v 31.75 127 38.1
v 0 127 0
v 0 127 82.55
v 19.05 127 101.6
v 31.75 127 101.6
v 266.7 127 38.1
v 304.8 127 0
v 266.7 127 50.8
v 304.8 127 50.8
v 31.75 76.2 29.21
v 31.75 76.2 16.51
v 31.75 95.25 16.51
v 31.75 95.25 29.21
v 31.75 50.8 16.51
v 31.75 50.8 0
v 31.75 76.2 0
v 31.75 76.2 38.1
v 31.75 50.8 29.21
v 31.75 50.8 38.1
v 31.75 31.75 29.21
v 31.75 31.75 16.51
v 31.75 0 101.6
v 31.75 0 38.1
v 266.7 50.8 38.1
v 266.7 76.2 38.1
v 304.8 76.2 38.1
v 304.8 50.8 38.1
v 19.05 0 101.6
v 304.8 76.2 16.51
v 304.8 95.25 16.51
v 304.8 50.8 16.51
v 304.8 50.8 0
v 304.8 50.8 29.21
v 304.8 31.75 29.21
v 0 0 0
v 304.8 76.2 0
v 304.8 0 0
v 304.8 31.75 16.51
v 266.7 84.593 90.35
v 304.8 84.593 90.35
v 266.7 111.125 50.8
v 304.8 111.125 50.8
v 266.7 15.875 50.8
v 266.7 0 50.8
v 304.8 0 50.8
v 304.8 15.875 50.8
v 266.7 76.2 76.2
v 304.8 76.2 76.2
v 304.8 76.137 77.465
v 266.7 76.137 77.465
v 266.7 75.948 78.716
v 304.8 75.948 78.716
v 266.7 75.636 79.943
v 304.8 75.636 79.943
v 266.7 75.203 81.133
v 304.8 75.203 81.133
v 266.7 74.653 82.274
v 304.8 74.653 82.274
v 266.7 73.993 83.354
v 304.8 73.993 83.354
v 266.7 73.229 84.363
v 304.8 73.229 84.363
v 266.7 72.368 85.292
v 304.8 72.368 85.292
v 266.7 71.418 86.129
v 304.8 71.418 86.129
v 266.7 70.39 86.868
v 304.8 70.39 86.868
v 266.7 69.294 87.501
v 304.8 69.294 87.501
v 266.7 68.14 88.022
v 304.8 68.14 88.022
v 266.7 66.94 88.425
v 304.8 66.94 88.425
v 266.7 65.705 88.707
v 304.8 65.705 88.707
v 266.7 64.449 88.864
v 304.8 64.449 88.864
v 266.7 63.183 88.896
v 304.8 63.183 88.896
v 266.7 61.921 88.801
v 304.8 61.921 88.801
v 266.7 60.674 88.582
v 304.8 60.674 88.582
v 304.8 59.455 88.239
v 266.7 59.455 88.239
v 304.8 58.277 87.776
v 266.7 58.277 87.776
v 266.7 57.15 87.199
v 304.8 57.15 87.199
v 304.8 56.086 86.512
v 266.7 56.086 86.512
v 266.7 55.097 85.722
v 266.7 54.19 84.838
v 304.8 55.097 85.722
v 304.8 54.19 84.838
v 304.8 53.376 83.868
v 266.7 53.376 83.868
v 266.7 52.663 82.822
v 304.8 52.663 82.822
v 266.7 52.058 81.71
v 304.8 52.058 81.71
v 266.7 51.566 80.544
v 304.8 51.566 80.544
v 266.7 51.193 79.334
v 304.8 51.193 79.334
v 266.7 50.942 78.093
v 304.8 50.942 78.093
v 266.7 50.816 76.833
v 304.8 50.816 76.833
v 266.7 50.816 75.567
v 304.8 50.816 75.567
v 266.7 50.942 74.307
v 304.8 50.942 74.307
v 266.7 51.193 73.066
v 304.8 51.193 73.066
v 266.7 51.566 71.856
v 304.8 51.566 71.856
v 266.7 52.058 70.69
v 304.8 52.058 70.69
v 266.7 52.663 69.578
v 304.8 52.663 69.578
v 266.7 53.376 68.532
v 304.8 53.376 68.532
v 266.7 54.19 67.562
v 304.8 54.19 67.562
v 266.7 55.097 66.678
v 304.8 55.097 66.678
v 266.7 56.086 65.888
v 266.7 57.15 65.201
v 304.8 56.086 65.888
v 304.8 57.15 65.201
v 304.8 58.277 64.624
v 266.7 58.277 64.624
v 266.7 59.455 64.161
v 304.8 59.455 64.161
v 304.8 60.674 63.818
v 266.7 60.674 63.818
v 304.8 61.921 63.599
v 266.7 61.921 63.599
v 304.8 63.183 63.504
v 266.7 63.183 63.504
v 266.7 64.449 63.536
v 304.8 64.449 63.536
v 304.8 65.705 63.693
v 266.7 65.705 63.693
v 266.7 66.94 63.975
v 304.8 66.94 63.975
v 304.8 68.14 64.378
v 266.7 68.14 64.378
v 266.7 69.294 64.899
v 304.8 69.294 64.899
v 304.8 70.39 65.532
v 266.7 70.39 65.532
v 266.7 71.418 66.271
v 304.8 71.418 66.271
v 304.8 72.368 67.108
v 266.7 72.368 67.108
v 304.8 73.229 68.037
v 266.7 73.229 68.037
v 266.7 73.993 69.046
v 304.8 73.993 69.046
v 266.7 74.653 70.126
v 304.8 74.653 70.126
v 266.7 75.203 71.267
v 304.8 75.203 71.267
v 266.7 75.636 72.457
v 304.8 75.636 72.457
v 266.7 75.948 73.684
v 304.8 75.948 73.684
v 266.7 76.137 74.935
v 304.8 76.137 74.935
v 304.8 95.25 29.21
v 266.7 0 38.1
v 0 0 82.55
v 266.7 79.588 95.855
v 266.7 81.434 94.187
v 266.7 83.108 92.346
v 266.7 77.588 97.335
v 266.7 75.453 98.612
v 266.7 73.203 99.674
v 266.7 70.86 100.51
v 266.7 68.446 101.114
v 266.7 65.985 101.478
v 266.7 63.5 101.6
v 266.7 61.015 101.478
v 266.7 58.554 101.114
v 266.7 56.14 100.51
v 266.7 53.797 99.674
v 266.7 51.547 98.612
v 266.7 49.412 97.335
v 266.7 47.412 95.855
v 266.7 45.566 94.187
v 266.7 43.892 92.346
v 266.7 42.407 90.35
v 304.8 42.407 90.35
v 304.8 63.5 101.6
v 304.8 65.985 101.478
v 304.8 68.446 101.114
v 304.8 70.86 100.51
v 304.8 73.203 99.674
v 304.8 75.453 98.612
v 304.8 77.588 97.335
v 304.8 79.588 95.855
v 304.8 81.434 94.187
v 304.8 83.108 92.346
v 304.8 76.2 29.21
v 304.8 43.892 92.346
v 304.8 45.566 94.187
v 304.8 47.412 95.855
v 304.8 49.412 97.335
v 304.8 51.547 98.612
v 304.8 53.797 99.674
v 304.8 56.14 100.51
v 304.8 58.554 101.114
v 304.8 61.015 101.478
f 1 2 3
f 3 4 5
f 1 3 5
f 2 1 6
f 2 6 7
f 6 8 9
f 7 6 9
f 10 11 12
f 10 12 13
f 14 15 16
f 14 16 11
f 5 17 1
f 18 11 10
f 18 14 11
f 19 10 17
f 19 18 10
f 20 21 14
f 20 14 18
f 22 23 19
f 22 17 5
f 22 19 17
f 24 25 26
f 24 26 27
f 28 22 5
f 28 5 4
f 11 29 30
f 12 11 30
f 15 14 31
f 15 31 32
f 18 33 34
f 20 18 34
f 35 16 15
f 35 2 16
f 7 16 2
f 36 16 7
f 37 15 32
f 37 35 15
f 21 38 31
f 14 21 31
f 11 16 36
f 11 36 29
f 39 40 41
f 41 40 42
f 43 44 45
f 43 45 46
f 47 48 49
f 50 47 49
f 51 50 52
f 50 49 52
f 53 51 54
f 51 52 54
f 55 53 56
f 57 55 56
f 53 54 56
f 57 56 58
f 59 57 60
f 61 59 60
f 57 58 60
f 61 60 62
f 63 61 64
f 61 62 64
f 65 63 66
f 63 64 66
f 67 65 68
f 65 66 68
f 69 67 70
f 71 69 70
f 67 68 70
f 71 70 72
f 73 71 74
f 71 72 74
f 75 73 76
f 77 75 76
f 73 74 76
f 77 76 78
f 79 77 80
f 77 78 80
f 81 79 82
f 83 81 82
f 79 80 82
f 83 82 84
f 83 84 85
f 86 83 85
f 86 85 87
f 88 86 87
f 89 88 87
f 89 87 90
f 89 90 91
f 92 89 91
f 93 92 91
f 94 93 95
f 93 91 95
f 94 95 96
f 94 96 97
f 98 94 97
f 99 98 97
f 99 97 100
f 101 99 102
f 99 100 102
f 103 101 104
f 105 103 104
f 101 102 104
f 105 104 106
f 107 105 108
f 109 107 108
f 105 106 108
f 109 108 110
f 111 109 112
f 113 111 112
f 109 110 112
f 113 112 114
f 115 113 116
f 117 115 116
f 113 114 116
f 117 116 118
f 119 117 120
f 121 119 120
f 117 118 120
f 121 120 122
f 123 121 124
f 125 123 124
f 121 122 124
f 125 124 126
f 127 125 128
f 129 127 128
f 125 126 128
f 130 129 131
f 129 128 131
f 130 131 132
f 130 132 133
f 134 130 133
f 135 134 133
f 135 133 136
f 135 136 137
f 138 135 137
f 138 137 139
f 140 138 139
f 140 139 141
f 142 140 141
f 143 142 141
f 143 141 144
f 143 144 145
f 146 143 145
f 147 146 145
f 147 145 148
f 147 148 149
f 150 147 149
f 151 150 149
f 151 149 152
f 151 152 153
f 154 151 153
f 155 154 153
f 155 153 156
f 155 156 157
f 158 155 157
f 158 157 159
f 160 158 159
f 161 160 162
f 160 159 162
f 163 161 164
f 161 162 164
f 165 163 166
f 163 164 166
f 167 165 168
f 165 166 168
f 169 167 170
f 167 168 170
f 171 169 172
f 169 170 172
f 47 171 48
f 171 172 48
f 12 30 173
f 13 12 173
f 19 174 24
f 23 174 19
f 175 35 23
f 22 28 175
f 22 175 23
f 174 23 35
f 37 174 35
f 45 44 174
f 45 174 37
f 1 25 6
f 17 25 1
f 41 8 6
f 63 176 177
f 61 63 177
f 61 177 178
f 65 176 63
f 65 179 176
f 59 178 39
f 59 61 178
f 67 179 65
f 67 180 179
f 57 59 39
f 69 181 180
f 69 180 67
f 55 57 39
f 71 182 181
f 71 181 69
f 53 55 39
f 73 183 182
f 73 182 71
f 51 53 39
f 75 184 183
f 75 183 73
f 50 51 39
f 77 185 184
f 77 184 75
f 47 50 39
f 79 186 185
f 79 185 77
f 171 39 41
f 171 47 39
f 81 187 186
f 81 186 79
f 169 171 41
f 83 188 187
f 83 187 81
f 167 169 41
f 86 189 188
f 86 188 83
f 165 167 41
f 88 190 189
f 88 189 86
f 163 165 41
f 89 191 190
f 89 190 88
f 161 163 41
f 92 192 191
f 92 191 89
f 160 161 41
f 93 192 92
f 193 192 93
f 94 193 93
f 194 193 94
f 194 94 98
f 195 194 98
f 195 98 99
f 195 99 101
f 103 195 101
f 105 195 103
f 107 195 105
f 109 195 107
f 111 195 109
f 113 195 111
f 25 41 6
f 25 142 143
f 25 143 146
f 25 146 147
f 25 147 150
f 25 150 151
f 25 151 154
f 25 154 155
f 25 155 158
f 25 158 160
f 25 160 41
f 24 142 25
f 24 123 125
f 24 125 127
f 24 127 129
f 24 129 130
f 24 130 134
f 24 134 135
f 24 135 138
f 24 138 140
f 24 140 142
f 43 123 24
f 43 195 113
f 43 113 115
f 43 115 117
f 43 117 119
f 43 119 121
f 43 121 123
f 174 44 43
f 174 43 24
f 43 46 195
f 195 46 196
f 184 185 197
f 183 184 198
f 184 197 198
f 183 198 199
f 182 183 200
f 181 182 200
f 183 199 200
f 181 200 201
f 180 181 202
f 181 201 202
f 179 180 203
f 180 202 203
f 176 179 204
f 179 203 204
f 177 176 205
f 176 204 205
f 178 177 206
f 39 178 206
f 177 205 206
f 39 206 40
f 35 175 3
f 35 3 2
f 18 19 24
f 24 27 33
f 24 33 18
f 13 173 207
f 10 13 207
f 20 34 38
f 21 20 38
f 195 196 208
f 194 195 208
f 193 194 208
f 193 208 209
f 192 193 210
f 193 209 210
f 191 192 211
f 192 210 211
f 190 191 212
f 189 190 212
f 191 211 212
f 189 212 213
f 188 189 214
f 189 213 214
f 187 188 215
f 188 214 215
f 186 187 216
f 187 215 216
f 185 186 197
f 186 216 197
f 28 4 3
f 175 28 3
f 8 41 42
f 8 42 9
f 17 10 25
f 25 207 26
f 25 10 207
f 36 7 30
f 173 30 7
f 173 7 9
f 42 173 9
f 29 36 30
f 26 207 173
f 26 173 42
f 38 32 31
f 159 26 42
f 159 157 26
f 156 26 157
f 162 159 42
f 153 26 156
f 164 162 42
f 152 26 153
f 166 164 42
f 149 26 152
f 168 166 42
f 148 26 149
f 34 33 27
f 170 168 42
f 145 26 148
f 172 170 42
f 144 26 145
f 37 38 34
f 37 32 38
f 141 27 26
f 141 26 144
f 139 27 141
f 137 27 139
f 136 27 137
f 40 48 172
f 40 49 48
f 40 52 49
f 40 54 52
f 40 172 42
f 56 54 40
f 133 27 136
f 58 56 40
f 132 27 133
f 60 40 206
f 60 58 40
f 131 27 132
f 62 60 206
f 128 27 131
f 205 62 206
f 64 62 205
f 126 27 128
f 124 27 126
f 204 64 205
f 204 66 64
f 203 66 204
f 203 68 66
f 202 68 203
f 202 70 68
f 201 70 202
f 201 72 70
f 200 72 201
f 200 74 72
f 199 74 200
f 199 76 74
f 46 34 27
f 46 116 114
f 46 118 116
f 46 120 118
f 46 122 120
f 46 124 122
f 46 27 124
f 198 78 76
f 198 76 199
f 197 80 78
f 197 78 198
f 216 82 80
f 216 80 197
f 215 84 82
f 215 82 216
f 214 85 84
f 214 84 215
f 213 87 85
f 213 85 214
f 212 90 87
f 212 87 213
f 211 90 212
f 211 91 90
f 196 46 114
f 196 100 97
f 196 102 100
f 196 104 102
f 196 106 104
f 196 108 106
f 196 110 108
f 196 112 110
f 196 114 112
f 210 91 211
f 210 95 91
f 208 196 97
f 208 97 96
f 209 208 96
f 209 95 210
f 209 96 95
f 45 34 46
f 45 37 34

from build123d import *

# Parameters (mm, degrees)
F1_DEPTH = 127
F3_DEPTH = 38.1
F4_DEPTH = 273.05
F2_R     = 12.7
F5_DEPTH = 38.1


with BuildPart() as f1:
    # F0 (on Front) → F1 (new body)
    with BuildSketch(Plane.XZ):
        Polygon((31.75, 101.6), (19.05, 101.6), (0, 82.55), (0, 0), (304.8, 0), (304.8, 101.6), (266.7, 101.6), (266.7, 38.1), (31.75, 38.1), align=None)
    extrude(amount=-F1_DEPTH)

    # F2 (on face) → F3 (cut)
    with BuildSketch(Plane.YZ.offset(304.8)):
        with BuildLine():
            Line((0, 101.6), (0, 50.8))
            Line((0, 50.8), (15.875, 50.8))
            Line((15.875, 50.8), (42.406574, 90.350173))
            ThreePointArc((42.406574, 90.350173), (51.547059, 98.611765), (63.5, 101.6))
            Line((63.5, 101.6), (0, 101.6))
        make_face()
        with BuildLine():
            Line((127, 101.6), (63.5, 101.6))
            ThreePointArc((63.5, 101.6), (75.452941, 98.611765), (84.593426, 90.350173))
            Line((84.593426, 90.350173), (111.125, 50.8))
            Line((111.125, 50.8), (127, 50.8))
            Line((127, 50.8), (127, 101.6))
        make_face()
    extrude(amount=-F3_DEPTH, mode=Mode.SUBTRACT)

    # F2 (on face) → F4 (cut)
    with BuildSketch(Plane.YZ.offset(304.8)):
        Polygon((50.8, 16.51), (50.8, 0), (76.2, 0), (76.2, 16.51), (95.25, 16.51), (95.25, 29.21), (76.2, 29.21), (76.2, 38.1), (63.5, 38.1), (50.8, 38.1), (50.8, 29.21), (31.75, 29.21), (31.75, 16.51), align=None)
    extrude(amount=-F4_DEPTH, mode=Mode.SUBTRACT)

    # F2 (on face) → F5 (cut)
    with BuildSketch(Plane.YZ.offset(304.8)):
        with Locations((63.5, 76.2)):
            Circle(F2_R)
    extrude(amount=-F5_DEPTH, mode=Mode.SUBTRACT)


solid = f1.part
